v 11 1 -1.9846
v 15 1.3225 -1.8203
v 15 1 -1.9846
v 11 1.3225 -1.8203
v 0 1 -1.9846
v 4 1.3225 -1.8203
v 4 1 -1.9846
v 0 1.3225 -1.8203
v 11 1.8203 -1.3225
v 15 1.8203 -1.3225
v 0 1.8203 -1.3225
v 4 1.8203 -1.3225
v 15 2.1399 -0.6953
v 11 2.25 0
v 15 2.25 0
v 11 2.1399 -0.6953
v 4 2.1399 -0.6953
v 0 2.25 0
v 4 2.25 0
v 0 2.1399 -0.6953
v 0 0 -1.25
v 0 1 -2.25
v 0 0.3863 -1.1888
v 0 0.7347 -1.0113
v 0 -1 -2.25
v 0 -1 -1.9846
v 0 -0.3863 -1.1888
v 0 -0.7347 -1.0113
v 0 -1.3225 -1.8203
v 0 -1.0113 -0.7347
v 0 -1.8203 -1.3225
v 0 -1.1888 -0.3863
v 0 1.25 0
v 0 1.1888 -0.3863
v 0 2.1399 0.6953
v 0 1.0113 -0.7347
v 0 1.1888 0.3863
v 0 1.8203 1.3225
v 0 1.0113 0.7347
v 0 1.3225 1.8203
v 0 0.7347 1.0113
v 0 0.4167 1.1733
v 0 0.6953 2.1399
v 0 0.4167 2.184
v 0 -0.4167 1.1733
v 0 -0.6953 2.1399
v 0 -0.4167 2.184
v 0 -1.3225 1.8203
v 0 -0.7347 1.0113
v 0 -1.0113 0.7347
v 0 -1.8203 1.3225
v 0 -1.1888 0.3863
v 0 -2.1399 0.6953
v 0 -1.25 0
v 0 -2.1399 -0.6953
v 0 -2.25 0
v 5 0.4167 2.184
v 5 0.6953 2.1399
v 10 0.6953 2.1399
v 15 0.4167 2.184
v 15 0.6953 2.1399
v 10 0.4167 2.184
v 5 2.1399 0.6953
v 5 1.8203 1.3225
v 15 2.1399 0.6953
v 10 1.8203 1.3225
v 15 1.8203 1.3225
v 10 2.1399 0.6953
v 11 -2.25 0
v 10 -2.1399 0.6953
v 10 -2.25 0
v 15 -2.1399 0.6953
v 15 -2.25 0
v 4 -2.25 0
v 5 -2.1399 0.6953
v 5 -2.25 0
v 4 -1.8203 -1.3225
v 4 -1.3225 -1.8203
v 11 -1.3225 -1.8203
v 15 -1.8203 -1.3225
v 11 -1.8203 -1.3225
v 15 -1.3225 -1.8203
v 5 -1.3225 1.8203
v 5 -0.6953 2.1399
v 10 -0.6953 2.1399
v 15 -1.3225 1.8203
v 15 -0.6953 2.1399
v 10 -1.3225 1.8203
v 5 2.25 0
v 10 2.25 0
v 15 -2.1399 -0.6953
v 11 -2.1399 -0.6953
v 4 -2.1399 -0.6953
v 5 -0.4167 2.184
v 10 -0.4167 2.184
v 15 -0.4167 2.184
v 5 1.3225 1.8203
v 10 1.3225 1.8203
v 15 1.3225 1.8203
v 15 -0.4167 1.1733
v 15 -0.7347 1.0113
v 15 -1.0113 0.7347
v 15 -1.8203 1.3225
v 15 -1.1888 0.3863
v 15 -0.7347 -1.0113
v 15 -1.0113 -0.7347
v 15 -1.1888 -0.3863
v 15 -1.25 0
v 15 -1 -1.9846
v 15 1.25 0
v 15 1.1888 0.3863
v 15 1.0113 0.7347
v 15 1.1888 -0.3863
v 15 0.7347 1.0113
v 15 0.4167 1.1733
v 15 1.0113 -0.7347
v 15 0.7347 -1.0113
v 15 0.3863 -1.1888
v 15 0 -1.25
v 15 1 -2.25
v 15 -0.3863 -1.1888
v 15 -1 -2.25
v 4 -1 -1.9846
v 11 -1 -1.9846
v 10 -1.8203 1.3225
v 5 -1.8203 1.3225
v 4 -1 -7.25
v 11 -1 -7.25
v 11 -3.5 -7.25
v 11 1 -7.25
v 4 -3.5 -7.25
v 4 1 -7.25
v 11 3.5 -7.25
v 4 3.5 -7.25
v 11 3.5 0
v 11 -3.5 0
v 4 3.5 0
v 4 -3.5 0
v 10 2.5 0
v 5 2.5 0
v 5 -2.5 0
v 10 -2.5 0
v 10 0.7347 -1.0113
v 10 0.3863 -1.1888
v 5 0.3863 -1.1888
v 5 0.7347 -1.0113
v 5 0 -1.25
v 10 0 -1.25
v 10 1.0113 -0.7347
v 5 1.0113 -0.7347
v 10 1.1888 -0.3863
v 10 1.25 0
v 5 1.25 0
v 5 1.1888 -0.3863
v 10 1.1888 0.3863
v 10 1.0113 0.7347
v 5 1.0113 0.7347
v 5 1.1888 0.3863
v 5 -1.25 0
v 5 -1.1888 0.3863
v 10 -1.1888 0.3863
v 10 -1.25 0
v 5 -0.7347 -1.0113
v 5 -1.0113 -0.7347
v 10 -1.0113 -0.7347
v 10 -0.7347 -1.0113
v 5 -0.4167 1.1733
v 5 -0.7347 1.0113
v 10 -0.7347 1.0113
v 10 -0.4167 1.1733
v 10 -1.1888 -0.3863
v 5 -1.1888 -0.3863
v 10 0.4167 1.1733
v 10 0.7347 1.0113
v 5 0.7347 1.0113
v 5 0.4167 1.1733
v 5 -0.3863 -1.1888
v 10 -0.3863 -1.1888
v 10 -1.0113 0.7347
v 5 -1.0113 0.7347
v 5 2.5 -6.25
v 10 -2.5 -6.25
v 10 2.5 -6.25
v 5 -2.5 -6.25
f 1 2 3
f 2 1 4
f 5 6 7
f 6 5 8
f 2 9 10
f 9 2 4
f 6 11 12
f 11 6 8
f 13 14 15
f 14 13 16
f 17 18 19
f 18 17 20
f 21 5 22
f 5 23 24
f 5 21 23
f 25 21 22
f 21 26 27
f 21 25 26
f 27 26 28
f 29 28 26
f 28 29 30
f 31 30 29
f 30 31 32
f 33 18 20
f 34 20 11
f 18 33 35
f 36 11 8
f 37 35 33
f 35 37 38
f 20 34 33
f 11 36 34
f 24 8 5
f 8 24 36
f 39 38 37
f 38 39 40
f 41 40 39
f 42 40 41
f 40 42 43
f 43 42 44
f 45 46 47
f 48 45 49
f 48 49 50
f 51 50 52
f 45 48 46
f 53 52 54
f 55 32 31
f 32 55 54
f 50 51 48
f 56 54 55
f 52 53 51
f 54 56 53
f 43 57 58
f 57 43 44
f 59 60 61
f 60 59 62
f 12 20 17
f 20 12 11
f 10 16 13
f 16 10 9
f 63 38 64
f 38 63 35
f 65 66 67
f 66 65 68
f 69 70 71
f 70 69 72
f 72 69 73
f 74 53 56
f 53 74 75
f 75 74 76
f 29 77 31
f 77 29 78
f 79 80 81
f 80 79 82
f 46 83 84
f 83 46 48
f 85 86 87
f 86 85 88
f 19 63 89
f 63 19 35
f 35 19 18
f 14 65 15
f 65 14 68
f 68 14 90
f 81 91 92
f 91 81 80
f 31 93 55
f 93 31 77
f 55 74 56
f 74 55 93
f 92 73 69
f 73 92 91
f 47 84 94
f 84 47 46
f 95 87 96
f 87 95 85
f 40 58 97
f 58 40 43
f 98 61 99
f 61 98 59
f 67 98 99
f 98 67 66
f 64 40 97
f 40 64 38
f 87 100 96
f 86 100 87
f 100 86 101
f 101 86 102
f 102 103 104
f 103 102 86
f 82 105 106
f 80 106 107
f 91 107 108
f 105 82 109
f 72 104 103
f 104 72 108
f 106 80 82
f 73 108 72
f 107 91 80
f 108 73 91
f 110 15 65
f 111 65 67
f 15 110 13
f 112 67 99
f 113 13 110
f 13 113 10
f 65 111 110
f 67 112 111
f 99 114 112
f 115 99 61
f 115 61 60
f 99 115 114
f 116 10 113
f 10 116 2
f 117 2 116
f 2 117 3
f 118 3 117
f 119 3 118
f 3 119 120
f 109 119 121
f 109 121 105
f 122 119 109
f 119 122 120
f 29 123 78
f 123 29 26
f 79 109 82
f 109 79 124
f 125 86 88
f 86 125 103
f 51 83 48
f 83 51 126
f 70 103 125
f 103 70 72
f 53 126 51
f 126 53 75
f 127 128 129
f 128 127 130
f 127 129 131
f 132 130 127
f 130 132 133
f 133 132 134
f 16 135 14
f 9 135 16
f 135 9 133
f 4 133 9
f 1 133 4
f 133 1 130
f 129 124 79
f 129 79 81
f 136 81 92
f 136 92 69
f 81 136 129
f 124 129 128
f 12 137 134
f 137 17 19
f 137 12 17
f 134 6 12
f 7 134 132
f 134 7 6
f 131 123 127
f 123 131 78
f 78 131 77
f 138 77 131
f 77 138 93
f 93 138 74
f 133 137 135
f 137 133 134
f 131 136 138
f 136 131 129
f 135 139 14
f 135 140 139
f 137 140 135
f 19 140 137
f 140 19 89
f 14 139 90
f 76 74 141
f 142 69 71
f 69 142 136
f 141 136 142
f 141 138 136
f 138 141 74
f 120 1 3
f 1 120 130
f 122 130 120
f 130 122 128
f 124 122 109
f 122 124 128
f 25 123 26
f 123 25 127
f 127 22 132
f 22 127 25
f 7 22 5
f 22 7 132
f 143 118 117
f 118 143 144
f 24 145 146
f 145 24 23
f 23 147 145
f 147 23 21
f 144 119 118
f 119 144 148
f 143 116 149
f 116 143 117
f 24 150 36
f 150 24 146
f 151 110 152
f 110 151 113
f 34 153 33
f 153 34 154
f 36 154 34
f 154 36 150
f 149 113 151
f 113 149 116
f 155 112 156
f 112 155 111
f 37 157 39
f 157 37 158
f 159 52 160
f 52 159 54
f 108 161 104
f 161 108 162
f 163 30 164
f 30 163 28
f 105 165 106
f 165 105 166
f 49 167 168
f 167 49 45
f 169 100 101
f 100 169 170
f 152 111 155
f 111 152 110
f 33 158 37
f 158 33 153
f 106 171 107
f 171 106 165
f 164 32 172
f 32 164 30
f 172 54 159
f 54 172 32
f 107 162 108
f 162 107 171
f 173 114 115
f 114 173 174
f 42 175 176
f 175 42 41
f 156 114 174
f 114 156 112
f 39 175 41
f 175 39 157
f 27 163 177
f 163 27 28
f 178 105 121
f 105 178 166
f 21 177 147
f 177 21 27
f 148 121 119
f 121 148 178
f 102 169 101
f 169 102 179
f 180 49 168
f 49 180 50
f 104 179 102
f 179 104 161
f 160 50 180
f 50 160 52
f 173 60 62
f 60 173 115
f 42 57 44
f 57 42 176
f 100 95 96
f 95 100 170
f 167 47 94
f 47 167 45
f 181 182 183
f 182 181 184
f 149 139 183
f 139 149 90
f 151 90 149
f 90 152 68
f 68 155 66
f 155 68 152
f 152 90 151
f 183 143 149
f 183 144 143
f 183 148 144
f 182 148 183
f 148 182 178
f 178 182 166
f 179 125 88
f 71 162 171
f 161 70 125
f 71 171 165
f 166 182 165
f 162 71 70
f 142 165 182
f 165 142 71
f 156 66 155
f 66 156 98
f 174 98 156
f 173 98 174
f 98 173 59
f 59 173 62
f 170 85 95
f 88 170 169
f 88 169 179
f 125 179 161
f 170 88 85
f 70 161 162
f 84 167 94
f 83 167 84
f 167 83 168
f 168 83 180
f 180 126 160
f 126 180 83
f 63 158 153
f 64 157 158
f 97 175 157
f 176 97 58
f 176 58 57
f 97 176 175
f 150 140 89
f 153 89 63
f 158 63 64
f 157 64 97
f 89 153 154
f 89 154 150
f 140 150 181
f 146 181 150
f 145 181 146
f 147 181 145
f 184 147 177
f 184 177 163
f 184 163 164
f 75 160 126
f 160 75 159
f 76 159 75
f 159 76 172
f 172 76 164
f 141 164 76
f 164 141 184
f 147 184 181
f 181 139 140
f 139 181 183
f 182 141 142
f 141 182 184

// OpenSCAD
magnet_side = 5; //mm
magnet_wall_thickness = 1; //mm
magnet_up = 5; //mm
magnet_holder_width = magnet_side + 2*magnet_wall_thickness;

spoke_diameter = 2.5; //mm

clip_length = 15; //mm
clip_wall_thickness = 1; //mm

clip_gap = spoke_diameter / 3; //mm
clip_diameter = spoke_diameter + (2 * clip_wall_thickness);

brace_thickness = 2; 

top_brace_up = magnet_up + magnet_side + magnet_wall_thickness;
top_brace_height = clip_length - top_brace_up;
brace_length = magnet_side + magnet_wall_thickness;
brace_across = spoke_diameter/2;

bottom_brace_height = magnet_up - magnet_wall_thickness;

$fn = 20;




// clip
rotate([0,90,0])  {
difference(){
	union() {
		cylinder(h = clip_length, d = clip_diameter); //clip wall
		translate([spoke_diameter/2, -magnet_holder_width/2, -magnet_wall_thickness+magnet_up]) cube([magnet_side + magnet_wall_thickness, magnet_holder_width, magnet_holder_width]); //magnet holder

		translate([0, -magnet_holder_width/2, -magnet_wall_thickness+magnet_up]) cube([spoke_diameter/2, magnet_holder_width, magnet_holder_width]); //magnet slide guide

		translate([brace_across, -brace_thickness/2, top_brace_up]) rotate([0,-90,-90]) linear_extrude(brace_thickness) polygon(points=[[0,0],[0, brace_length],[top_brace_height,clip_wall_thickness],[top_brace_height,0]]); //top brace

		#translate([brace_across, -brace_thickness/2]) rotate([0,-90,-90]) linear_extrude(brace_thickness) polygon(points=[[0,0],[bottom_brace_height,0],[bottom_brace_height, brace_length],[0,clip_wall_thickness]]); //top brace

		//translate([spoke_diameter/2, -brace_thickness/2, magnet_up + magnet_side]) #cube([magnet_side + magnet_wall_thickness, brace_thickness, clip_length - magnet_side - magnet_up ]);//top brace
	}
	cylinder(h = clip_length, d = spoke_diameter); //hole for spoke
	translate([-clip_diameter,-clip_gap/2]) cube([clip_diameter, clip_gap, clip_length]); //gap to get it on
	translate([spoke_diameter/2, -magnet_side/2, magnet_up]) cube([magnet_side, magnet_side, magnet_side]); //maget space

	translate([-spoke_diameter/2 - clip_wall_thickness, -magnet_side/2, magnet_up]) cube([spoke_diameter+clip_wall_thickness, magnet_side, magnet_side]); //magnet going through clipspace
}
}
